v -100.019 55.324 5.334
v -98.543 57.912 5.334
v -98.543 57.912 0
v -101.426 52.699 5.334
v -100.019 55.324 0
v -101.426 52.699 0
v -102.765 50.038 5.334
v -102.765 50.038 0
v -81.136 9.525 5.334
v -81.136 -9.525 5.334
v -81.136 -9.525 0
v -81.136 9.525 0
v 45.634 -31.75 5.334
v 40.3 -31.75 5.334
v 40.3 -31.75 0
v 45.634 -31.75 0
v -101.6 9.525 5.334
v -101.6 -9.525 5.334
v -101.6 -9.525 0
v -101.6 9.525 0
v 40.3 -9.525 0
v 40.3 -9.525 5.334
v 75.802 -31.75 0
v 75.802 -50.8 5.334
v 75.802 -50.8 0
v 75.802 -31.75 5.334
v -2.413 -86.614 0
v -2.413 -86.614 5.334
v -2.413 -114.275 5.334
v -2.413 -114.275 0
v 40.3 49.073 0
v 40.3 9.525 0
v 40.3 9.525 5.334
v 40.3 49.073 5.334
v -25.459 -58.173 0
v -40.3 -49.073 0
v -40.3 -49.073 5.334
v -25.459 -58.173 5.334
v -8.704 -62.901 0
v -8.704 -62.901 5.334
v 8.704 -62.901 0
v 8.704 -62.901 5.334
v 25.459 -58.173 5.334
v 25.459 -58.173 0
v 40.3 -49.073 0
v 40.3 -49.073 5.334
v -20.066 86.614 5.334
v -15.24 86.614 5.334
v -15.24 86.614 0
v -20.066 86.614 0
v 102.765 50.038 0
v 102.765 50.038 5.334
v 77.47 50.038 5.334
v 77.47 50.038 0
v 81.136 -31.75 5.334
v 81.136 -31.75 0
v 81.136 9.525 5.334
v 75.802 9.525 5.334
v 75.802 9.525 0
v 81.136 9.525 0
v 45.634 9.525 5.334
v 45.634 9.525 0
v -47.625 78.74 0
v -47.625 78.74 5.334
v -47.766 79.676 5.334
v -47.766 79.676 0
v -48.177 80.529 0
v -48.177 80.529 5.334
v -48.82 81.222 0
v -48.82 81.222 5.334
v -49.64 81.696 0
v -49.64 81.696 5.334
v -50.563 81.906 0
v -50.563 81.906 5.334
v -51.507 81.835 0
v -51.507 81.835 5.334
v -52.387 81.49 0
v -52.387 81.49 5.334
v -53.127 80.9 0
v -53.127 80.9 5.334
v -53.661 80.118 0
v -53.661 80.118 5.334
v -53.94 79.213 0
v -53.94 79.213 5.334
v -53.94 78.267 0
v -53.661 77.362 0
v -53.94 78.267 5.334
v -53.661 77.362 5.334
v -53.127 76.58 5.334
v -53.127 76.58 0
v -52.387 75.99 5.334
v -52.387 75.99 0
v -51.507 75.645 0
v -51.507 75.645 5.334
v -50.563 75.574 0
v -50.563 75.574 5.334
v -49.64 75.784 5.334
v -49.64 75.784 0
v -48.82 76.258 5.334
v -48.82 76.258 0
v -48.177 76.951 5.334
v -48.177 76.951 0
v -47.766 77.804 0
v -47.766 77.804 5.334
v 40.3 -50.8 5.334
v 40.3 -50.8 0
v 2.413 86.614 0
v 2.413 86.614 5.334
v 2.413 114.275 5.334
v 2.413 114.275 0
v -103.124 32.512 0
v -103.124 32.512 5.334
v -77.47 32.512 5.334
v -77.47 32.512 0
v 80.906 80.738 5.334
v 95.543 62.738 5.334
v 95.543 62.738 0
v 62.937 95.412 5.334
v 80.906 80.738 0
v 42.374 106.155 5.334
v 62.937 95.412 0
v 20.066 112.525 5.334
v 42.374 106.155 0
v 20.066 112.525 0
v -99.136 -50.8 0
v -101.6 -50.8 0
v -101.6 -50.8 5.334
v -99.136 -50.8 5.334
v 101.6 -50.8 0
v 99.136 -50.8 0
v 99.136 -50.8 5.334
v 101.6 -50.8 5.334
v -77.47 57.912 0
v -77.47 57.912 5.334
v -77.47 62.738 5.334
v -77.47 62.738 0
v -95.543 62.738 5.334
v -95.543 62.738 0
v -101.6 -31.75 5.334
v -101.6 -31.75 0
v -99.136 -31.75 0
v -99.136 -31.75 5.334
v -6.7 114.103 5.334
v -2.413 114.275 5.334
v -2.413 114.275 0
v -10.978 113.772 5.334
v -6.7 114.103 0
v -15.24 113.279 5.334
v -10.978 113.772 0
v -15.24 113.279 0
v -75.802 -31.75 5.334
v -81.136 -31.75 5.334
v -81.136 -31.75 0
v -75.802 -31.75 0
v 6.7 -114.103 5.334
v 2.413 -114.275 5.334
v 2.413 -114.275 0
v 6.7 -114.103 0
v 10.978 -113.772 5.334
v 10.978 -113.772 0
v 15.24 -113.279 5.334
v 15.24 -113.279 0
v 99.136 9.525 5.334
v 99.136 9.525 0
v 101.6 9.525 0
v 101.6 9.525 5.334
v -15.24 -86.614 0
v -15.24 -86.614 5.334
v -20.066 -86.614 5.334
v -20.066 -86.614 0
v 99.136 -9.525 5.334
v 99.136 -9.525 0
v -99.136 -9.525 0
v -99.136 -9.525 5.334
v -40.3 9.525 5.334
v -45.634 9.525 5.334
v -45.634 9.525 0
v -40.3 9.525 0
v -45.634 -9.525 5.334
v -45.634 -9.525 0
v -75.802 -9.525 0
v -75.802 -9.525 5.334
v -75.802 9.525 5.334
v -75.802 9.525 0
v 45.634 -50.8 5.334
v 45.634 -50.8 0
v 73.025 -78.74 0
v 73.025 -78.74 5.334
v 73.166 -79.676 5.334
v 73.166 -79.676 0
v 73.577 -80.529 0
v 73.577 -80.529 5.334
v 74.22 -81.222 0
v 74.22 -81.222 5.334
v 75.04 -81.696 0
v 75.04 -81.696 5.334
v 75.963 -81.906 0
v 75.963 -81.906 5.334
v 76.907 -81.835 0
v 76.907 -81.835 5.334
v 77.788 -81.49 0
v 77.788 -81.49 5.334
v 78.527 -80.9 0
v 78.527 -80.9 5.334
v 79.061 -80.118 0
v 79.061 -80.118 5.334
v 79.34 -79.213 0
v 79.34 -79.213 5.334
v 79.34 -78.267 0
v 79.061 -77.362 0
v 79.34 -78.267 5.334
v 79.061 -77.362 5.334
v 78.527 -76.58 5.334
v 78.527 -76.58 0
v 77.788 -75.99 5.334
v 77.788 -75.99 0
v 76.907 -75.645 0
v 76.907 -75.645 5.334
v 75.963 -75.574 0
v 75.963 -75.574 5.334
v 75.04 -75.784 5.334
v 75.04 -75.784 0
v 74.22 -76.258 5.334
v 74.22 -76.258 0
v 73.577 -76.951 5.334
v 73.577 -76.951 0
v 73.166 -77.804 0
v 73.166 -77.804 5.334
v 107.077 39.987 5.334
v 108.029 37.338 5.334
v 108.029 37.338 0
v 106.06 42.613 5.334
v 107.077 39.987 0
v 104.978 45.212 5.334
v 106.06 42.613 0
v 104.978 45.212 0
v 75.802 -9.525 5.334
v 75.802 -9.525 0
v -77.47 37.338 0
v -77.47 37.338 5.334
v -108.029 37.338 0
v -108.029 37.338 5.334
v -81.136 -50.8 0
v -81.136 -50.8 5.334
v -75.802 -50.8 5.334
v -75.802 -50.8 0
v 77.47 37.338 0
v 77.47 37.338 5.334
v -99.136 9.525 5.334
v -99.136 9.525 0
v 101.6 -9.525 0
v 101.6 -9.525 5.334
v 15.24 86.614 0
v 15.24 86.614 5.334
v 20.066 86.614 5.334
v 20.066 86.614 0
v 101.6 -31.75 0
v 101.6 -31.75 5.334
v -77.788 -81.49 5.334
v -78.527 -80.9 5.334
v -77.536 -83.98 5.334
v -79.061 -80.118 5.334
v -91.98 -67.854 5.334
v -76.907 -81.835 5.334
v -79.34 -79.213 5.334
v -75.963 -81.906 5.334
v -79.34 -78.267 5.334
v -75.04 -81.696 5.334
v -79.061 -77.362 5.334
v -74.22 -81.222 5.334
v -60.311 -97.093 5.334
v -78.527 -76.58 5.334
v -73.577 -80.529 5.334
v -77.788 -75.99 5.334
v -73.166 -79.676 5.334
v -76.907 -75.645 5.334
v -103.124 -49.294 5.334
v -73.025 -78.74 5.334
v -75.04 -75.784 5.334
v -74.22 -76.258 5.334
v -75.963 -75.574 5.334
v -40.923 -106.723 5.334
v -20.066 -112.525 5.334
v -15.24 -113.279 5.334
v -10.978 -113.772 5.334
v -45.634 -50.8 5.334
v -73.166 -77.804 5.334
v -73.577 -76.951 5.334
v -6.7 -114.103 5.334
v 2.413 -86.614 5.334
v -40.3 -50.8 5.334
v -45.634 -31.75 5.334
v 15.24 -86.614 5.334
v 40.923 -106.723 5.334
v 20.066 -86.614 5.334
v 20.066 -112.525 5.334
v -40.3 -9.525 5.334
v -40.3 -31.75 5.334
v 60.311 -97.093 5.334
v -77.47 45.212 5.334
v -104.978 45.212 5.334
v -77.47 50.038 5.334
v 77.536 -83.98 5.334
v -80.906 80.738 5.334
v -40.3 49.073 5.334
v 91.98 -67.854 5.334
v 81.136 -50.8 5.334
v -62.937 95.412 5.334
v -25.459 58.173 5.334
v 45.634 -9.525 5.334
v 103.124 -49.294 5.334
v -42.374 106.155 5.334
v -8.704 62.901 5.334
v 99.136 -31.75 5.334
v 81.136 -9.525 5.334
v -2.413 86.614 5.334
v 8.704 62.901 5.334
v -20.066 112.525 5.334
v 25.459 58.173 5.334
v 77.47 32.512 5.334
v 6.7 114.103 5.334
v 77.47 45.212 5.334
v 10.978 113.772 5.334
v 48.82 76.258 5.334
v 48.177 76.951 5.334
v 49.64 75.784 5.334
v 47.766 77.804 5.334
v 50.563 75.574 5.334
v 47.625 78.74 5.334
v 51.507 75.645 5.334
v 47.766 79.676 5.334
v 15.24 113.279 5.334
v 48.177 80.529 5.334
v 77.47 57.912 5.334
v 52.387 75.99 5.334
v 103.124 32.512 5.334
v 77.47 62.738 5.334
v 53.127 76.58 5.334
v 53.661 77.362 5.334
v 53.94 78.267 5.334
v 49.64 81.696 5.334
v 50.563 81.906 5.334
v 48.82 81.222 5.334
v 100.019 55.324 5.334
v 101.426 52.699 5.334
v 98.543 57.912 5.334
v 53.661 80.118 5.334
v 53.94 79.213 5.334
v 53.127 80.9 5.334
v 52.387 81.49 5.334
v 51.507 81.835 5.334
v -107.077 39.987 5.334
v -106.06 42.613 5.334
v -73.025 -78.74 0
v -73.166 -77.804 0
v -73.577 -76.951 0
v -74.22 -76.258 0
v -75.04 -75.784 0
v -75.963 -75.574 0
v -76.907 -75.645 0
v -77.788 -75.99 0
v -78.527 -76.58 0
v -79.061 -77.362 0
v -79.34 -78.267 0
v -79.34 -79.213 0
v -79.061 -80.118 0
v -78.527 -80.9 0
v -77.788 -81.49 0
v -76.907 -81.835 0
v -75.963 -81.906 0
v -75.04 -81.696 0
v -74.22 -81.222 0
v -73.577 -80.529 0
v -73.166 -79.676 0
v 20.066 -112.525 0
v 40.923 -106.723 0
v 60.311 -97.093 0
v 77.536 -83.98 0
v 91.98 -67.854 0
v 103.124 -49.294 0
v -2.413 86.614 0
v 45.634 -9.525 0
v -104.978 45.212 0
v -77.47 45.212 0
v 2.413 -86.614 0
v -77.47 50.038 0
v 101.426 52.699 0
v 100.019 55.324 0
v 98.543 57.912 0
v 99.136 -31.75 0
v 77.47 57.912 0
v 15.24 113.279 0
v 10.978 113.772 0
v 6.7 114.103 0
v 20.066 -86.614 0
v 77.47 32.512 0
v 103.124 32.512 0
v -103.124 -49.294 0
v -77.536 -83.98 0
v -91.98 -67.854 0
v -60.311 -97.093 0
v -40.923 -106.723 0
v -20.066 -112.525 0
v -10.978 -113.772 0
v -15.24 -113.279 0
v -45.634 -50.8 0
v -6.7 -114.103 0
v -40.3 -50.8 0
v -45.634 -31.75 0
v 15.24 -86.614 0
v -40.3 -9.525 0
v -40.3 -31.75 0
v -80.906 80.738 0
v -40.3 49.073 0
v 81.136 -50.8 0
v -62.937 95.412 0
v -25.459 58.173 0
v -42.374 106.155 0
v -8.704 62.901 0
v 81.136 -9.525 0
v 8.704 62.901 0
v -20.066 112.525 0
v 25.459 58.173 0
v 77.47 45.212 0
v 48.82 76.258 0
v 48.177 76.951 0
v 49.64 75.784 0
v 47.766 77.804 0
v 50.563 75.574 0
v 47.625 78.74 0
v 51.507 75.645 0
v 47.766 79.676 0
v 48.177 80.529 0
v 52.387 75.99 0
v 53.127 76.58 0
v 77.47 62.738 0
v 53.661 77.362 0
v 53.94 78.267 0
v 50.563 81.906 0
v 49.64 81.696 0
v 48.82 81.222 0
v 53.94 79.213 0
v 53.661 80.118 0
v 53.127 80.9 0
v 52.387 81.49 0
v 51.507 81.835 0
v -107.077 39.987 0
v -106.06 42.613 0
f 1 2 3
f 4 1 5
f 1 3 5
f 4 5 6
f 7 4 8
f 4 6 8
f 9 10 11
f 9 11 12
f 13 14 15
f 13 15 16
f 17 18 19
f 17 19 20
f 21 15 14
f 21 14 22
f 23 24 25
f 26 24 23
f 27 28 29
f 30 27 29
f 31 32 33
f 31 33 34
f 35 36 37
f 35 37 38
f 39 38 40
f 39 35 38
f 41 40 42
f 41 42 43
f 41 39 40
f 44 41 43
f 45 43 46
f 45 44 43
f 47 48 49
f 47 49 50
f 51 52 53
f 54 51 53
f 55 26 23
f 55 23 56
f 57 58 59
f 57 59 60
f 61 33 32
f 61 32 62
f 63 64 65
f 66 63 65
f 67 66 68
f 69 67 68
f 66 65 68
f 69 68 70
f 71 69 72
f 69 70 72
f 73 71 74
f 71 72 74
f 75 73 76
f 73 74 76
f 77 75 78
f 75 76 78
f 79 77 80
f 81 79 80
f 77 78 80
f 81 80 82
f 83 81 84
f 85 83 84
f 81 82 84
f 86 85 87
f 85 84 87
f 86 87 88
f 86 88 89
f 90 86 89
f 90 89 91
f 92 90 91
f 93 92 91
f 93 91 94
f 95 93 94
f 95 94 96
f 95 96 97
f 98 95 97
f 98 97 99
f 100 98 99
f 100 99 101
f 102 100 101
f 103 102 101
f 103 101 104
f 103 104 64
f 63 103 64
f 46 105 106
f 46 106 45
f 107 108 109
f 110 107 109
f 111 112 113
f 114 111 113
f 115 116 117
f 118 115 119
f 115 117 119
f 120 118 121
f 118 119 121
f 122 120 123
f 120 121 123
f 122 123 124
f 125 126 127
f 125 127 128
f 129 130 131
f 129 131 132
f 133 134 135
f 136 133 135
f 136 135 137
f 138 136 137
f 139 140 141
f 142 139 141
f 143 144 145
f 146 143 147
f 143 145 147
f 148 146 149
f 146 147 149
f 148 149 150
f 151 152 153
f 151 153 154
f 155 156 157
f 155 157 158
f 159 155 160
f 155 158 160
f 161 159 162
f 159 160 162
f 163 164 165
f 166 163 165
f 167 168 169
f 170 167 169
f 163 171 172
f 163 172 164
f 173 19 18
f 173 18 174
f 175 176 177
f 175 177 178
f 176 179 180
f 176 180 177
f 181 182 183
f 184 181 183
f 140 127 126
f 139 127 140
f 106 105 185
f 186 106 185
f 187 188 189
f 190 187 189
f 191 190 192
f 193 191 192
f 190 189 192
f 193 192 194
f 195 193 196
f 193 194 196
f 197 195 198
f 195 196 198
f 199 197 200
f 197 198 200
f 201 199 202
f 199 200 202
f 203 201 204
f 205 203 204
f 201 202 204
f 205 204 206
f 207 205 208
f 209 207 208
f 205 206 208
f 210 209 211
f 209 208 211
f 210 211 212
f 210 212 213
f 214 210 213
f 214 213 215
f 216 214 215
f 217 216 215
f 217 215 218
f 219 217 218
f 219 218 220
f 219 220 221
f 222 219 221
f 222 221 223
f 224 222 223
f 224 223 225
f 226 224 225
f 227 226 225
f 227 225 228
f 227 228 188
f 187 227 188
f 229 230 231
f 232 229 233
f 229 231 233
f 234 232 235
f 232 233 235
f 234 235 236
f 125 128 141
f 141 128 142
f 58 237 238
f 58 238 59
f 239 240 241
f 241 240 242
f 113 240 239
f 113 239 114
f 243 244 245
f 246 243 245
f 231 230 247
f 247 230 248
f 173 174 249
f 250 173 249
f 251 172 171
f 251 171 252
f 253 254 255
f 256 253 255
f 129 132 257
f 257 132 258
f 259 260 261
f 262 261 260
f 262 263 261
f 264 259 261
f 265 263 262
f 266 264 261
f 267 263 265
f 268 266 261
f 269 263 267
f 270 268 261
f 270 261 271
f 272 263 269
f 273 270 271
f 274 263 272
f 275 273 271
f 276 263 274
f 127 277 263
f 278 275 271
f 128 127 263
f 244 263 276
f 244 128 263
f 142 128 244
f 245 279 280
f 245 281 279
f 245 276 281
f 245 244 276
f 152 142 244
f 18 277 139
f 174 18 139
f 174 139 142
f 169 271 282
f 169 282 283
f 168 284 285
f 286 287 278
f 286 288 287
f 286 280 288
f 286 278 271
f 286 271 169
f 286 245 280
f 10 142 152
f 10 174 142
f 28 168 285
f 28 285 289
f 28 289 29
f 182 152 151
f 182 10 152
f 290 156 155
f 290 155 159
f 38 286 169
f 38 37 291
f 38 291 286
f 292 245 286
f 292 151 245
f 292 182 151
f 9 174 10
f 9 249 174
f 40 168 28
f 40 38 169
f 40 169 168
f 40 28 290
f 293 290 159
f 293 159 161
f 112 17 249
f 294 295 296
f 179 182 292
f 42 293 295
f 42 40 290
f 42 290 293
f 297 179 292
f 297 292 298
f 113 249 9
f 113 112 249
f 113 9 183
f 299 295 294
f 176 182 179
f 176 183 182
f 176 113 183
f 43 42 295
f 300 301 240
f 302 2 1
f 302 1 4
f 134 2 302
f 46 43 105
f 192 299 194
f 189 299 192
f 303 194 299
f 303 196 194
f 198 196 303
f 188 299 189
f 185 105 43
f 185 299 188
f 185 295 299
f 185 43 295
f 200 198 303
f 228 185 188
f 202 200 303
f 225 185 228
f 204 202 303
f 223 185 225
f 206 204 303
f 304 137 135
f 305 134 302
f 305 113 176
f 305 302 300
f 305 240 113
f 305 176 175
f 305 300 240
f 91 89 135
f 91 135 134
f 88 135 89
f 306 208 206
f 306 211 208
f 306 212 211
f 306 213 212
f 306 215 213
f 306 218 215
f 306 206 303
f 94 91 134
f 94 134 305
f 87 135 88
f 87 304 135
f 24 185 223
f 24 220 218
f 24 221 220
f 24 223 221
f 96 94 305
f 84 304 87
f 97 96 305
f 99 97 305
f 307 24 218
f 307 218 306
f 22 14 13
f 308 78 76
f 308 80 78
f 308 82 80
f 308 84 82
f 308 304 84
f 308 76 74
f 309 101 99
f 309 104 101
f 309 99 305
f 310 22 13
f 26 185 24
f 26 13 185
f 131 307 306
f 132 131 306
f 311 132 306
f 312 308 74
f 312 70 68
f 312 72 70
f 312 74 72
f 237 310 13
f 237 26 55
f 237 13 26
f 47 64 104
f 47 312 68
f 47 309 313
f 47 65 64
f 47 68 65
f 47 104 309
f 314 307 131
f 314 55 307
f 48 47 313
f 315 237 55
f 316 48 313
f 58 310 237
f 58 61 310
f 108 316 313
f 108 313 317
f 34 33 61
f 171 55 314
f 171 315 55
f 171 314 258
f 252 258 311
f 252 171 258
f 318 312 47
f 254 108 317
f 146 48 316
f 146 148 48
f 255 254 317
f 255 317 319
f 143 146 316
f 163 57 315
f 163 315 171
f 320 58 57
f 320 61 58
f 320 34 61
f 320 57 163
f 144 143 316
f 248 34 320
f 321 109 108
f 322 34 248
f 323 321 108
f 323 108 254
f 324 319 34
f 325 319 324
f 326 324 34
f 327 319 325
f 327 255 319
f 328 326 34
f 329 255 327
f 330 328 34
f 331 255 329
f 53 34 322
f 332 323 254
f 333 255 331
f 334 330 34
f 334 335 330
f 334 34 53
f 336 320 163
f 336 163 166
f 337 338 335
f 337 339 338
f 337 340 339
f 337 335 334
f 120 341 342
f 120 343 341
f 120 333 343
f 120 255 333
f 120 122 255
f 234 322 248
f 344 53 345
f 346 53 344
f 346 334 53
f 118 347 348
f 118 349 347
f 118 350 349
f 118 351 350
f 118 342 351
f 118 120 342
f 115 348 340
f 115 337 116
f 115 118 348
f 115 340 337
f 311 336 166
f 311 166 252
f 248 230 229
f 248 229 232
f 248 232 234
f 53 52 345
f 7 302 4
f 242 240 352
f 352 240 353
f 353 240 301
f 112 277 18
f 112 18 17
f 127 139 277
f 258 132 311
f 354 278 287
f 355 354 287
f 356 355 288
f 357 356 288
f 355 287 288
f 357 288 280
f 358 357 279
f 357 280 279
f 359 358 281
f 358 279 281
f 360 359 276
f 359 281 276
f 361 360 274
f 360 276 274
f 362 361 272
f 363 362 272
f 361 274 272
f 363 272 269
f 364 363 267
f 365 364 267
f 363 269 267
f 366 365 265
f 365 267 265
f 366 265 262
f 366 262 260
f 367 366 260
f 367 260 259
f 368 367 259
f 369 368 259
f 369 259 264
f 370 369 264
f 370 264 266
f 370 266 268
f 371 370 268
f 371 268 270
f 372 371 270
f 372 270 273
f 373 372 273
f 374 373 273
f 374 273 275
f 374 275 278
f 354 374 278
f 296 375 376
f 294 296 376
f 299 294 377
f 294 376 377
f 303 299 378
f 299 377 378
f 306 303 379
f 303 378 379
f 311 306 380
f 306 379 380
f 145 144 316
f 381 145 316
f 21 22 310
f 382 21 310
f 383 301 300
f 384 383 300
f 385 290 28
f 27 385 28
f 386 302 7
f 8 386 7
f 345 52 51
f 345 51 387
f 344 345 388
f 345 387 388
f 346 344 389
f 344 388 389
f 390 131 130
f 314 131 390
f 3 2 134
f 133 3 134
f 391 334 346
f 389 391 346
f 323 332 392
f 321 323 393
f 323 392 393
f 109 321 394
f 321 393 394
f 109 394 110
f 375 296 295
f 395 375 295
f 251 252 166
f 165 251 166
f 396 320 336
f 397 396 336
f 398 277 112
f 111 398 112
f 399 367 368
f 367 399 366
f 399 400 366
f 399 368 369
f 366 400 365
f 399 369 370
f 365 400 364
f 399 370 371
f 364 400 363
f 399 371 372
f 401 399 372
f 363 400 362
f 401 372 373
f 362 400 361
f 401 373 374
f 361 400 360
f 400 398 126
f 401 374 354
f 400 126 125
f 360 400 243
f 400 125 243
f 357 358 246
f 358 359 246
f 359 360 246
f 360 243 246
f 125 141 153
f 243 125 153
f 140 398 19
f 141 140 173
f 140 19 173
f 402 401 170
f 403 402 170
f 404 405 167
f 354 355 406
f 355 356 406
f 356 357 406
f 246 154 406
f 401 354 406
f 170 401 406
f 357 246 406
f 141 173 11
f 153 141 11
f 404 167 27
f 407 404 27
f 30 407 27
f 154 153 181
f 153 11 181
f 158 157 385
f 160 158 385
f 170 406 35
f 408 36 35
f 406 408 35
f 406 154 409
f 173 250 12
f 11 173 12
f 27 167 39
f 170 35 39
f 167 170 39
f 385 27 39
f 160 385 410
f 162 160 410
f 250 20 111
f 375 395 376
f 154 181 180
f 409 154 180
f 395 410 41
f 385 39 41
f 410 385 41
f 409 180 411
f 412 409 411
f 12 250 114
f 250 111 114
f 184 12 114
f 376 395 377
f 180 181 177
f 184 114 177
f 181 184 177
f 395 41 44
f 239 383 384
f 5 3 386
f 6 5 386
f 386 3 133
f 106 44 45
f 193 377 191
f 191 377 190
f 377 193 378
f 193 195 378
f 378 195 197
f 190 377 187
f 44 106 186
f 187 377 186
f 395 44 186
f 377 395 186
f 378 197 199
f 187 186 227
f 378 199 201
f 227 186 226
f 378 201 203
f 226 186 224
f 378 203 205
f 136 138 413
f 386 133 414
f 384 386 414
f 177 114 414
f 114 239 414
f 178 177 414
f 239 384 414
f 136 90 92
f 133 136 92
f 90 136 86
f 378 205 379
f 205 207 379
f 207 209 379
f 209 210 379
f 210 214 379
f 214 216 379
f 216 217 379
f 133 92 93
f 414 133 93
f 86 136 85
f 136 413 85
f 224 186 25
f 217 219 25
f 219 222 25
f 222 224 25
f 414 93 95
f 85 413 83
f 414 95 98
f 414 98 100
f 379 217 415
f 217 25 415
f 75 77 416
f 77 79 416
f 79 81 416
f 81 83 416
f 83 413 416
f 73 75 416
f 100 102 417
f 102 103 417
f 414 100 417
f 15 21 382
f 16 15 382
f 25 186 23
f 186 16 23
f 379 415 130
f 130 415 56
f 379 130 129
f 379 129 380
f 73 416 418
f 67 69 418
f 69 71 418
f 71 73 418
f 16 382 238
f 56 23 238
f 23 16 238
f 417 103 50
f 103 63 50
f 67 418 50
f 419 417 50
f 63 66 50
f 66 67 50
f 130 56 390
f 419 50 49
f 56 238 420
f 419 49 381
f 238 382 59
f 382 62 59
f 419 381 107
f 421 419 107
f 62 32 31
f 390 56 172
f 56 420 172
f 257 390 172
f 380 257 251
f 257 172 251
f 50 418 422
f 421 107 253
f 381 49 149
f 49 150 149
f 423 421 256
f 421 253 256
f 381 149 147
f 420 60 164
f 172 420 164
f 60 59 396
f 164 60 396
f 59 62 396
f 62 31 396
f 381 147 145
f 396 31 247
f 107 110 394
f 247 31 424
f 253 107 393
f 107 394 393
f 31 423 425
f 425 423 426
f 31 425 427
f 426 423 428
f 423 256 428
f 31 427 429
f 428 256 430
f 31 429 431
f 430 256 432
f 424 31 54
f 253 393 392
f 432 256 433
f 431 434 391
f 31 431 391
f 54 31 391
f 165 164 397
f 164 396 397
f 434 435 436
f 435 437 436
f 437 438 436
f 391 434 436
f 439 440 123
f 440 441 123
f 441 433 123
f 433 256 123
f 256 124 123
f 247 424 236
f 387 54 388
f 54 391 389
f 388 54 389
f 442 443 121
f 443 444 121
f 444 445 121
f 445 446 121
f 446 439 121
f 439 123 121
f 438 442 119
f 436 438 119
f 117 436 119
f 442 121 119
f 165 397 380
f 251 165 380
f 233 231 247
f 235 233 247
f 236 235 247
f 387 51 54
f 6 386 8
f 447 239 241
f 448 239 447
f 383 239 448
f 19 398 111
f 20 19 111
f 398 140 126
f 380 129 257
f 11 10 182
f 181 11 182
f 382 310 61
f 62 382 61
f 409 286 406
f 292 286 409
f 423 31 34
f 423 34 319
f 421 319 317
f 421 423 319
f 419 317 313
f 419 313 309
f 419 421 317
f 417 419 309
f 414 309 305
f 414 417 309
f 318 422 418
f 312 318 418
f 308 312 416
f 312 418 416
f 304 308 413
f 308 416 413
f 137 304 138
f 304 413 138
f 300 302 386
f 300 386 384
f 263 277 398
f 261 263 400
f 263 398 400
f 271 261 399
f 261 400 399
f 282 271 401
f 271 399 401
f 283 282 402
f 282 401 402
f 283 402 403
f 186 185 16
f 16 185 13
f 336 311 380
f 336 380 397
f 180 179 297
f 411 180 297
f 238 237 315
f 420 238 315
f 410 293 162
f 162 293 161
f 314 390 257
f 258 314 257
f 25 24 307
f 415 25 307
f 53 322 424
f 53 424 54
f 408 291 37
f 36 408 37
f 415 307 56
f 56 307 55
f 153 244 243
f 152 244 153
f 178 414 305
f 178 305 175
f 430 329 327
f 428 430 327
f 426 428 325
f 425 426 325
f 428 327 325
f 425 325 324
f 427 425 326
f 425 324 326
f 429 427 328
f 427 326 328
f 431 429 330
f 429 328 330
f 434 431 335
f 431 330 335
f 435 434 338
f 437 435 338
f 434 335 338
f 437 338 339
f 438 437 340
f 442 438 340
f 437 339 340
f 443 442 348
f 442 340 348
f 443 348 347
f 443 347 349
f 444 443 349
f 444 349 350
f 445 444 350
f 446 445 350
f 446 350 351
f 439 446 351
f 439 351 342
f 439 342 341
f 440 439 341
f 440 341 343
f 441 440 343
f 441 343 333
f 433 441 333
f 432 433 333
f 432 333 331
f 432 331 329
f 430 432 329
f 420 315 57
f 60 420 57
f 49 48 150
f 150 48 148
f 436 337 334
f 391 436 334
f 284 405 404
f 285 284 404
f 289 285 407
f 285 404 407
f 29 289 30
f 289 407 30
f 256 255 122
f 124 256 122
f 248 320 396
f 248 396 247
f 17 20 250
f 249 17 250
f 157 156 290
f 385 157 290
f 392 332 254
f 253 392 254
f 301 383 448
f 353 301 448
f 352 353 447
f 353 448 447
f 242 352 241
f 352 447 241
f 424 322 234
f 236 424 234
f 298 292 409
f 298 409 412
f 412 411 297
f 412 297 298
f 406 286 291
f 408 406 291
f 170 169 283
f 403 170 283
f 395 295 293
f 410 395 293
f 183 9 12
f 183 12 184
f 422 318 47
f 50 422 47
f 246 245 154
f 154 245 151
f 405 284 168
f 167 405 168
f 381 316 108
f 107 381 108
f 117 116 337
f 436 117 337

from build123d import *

# Parameters (mm, degrees)
SKETCH1_R           = 114.3
BOSS_EXTRUDE1_DEPTH = 5.334
TOPBOTTOMCUTS_DEPTH = 162.732592745
SIDECUTS_DEPTH      = 162.714591138
SKETCH4_W           = 2.4638
SKETCH4_H           = 19.05
SKETCH4_W_2         = 5.334
MOTORMOUNTS_DEPTH   = 162.714591138
SKETCH5_R           = 3.175
BOLTHOLES_DEPTH     = 162.714591138
SKETCH6_W           = 22.352
SKETCH6_H           = 83.470360746
WHEEL_CUTOUTS_DEPTH = 162.714591138


with BuildPart() as part:
    # Sketch1 → Boss-Extrude1 (new body)
    with BuildSketch(Plane.XY):
        Circle(SKETCH1_R)
        with BuildLine():
            Line((-40.299999918, 49.073006904), (-40.299999918, -49.073006904))
            ThreePointArc((-40.299999918, -49.073006904), (0, -63.5), (40.299999918, -49.073006904))
            Line((40.299999918, -49.073006904), (40.299999918, 49.073006904))
            ThreePointArc((40.299999918, 49.073006904), (0, 63.5), (-40.299999918, 49.073006904))
        make_face(mode=Mode.SUBTRACT)
    extrude(amount=BOSS_EXTRUDE1_DEPTH)

    # Sketch2 → TopBottomCuts (cut, through all)
    with BuildSketch(Plane.XY.offset(5.334)):
        Polygon((-20.066, 92.964), (-20.066, 116.329451538), (-15.24, 116.329451538), (-15.24, 92.964), (-15.24, 86.614), (-20.066, 86.614), align=None)
        Polygon((15.24, 92.964), (15.24, 86.614), (20.066, 86.614), (20.066, 92.964), (20.066, 116.329451538), (15.24, 116.329451538), align=None)
        Polygon((-2.413, 92.964), (-2.413, 86.614), (2.413, 86.614), (2.413, 92.964), (2.413, 116.329451538), (-2.413, 116.329451538), align=None)
        Polygon((20.066, -116.329451538), (20.066, -92.964), (20.066, -86.614), (15.24, -86.614), (15.24, -92.964), (15.24, -116.329451538), align=None)
        Polygon((2.413, -116.329451538), (2.413, -92.964), (2.413, -86.614), (-2.413, -86.614), (-2.413, -92.964), (-2.413, -116.329451538), align=None)
        Polygon((-15.24, -116.329451538), (-15.24, -92.964), (-15.24, -86.614), (-20.066, -86.614), (-20.066, -92.964), (-20.066, -116.329451538), align=None)
    extrude(amount=-TOPBOTTOMCUTS_DEPTH, mode=Mode.SUBTRACT)

    # Sketch3 → SideCuts (cut, through all)
    with BuildSketch(Plane.XY.offset(5.334)):
        Polygon((-83.82, 37.338), (-77.47, 37.338), (-77.47, 32.512), (-83.82, 32.512), (-110.947890819, 32.512), (-110.947890819, 37.338), align=None)
        Polygon((-83.82, 62.738), (-104.163602824, 62.738), (-104.163602824, 57.912), (-83.82, 57.912), (-77.47, 57.912), (-77.47, 62.738), align=None)
        Polygon((-83.82, 50.038), (-77.47, 50.038), (-77.47, 45.212), (-83.82, 45.212), (-108.296559878, 45.212), (-108.296559878, 50.038), align=None)
        Polygon((110.947890819, 32.512), (83.82, 32.512), (77.47, 32.512), (77.47, 37.338), (83.82, 37.338), (110.947890819, 37.338), align=None)
        Polygon((108.296559878, 45.212), (83.82, 45.212), (77.47, 45.212), (77.47, 50.038), (83.82, 50.038), (108.296559878, 50.038), align=None)
        Polygon((77.47, 62.738), (77.47, 57.912), (83.82, 57.912), (104.163602824, 57.912), (104.163602824, 62.738), (83.82, 62.738), align=None)
    extrude(amount=-SIDECUTS_DEPTH, mode=Mode.SUBTRACT)

    # Sketch4 → MotorMounts (cut, through all)
    with BuildSketch(Plane.XY.offset(5.334)):
        with Locations((-100.3681, -41.275)):
            Rectangle(SKETCH4_W, SKETCH4_H)
        with Locations((-100.3681, 0)):
            Rectangle(SKETCH4_W, SKETCH4_H)
        with Locations((-78.469199932, 0)):
            Rectangle(SKETCH4_W_2, SKETCH4_H)
        with Locations((-42.966999918, 0)):
            Rectangle(SKETCH4_W_2, SKETCH4_H)
        with Locations((-78.469199932, -41.275)):
            Rectangle(SKETCH4_W_2, SKETCH4_H)
        with Locations((-42.966999918, -41.275)):
            Rectangle(SKETCH4_W_2, SKETCH4_H)
        with Locations((42.966999918, -41.275)):
            Rectangle(SKETCH4_W_2, SKETCH4_H)
        with Locations((78.469199932, -41.275)):
            Rectangle(SKETCH4_W_2, SKETCH4_H)
        with Locations((100.3681, -41.275)):
            Rectangle(SKETCH4_W, SKETCH4_H)
        with Locations((42.966999918, 0)):
            Rectangle(SKETCH4_W_2, SKETCH4_H)
        with Locations((78.469199932, 0)):
            Rectangle(SKETCH4_W_2, SKETCH4_H)
        with Locations((100.3681, 0)):
            Rectangle(SKETCH4_W, SKETCH4_H)
    extrude(amount=-MOTORMOUNTS_DEPTH, mode=Mode.SUBTRACT)

    # Sketch5 → BoltHoles (cut, through all)
    with BuildSketch(Plane.XY.offset(5.334)):
        with Locations((-76.2, -78.74)):
            Circle(SKETCH5_R)
        with Locations((-50.8, 78.74)):
            Circle(SKETCH5_R)
        with Locations(Location((76.2, -78.74, 0), (0, 0, 180))):
            Circle(SKETCH5_R)
        with Locations(Location((50.8, 78.74, 0), (0, 0, 180))):
            Circle(SKETCH5_R)
    extrude(amount=-BOLTHOLES_DEPTH, mode=Mode.SUBTRACT)

    # Sketch6 → Wheel Cutouts (cut, through all)
    with BuildSketch(Plane.XY.offset(5.334)):
        with Locations((-114.3, -7.559146116)):
            Rectangle(SKETCH6_W, SKETCH6_H)
        with Locations((114.3, -7.559146116)):
            Rectangle(SKETCH6_W, SKETCH6_H)
    extrude(amount=-WHEEL_CUTOUTS_DEPTH, mode=Mode.SUBTRACT)


solid = part.part
